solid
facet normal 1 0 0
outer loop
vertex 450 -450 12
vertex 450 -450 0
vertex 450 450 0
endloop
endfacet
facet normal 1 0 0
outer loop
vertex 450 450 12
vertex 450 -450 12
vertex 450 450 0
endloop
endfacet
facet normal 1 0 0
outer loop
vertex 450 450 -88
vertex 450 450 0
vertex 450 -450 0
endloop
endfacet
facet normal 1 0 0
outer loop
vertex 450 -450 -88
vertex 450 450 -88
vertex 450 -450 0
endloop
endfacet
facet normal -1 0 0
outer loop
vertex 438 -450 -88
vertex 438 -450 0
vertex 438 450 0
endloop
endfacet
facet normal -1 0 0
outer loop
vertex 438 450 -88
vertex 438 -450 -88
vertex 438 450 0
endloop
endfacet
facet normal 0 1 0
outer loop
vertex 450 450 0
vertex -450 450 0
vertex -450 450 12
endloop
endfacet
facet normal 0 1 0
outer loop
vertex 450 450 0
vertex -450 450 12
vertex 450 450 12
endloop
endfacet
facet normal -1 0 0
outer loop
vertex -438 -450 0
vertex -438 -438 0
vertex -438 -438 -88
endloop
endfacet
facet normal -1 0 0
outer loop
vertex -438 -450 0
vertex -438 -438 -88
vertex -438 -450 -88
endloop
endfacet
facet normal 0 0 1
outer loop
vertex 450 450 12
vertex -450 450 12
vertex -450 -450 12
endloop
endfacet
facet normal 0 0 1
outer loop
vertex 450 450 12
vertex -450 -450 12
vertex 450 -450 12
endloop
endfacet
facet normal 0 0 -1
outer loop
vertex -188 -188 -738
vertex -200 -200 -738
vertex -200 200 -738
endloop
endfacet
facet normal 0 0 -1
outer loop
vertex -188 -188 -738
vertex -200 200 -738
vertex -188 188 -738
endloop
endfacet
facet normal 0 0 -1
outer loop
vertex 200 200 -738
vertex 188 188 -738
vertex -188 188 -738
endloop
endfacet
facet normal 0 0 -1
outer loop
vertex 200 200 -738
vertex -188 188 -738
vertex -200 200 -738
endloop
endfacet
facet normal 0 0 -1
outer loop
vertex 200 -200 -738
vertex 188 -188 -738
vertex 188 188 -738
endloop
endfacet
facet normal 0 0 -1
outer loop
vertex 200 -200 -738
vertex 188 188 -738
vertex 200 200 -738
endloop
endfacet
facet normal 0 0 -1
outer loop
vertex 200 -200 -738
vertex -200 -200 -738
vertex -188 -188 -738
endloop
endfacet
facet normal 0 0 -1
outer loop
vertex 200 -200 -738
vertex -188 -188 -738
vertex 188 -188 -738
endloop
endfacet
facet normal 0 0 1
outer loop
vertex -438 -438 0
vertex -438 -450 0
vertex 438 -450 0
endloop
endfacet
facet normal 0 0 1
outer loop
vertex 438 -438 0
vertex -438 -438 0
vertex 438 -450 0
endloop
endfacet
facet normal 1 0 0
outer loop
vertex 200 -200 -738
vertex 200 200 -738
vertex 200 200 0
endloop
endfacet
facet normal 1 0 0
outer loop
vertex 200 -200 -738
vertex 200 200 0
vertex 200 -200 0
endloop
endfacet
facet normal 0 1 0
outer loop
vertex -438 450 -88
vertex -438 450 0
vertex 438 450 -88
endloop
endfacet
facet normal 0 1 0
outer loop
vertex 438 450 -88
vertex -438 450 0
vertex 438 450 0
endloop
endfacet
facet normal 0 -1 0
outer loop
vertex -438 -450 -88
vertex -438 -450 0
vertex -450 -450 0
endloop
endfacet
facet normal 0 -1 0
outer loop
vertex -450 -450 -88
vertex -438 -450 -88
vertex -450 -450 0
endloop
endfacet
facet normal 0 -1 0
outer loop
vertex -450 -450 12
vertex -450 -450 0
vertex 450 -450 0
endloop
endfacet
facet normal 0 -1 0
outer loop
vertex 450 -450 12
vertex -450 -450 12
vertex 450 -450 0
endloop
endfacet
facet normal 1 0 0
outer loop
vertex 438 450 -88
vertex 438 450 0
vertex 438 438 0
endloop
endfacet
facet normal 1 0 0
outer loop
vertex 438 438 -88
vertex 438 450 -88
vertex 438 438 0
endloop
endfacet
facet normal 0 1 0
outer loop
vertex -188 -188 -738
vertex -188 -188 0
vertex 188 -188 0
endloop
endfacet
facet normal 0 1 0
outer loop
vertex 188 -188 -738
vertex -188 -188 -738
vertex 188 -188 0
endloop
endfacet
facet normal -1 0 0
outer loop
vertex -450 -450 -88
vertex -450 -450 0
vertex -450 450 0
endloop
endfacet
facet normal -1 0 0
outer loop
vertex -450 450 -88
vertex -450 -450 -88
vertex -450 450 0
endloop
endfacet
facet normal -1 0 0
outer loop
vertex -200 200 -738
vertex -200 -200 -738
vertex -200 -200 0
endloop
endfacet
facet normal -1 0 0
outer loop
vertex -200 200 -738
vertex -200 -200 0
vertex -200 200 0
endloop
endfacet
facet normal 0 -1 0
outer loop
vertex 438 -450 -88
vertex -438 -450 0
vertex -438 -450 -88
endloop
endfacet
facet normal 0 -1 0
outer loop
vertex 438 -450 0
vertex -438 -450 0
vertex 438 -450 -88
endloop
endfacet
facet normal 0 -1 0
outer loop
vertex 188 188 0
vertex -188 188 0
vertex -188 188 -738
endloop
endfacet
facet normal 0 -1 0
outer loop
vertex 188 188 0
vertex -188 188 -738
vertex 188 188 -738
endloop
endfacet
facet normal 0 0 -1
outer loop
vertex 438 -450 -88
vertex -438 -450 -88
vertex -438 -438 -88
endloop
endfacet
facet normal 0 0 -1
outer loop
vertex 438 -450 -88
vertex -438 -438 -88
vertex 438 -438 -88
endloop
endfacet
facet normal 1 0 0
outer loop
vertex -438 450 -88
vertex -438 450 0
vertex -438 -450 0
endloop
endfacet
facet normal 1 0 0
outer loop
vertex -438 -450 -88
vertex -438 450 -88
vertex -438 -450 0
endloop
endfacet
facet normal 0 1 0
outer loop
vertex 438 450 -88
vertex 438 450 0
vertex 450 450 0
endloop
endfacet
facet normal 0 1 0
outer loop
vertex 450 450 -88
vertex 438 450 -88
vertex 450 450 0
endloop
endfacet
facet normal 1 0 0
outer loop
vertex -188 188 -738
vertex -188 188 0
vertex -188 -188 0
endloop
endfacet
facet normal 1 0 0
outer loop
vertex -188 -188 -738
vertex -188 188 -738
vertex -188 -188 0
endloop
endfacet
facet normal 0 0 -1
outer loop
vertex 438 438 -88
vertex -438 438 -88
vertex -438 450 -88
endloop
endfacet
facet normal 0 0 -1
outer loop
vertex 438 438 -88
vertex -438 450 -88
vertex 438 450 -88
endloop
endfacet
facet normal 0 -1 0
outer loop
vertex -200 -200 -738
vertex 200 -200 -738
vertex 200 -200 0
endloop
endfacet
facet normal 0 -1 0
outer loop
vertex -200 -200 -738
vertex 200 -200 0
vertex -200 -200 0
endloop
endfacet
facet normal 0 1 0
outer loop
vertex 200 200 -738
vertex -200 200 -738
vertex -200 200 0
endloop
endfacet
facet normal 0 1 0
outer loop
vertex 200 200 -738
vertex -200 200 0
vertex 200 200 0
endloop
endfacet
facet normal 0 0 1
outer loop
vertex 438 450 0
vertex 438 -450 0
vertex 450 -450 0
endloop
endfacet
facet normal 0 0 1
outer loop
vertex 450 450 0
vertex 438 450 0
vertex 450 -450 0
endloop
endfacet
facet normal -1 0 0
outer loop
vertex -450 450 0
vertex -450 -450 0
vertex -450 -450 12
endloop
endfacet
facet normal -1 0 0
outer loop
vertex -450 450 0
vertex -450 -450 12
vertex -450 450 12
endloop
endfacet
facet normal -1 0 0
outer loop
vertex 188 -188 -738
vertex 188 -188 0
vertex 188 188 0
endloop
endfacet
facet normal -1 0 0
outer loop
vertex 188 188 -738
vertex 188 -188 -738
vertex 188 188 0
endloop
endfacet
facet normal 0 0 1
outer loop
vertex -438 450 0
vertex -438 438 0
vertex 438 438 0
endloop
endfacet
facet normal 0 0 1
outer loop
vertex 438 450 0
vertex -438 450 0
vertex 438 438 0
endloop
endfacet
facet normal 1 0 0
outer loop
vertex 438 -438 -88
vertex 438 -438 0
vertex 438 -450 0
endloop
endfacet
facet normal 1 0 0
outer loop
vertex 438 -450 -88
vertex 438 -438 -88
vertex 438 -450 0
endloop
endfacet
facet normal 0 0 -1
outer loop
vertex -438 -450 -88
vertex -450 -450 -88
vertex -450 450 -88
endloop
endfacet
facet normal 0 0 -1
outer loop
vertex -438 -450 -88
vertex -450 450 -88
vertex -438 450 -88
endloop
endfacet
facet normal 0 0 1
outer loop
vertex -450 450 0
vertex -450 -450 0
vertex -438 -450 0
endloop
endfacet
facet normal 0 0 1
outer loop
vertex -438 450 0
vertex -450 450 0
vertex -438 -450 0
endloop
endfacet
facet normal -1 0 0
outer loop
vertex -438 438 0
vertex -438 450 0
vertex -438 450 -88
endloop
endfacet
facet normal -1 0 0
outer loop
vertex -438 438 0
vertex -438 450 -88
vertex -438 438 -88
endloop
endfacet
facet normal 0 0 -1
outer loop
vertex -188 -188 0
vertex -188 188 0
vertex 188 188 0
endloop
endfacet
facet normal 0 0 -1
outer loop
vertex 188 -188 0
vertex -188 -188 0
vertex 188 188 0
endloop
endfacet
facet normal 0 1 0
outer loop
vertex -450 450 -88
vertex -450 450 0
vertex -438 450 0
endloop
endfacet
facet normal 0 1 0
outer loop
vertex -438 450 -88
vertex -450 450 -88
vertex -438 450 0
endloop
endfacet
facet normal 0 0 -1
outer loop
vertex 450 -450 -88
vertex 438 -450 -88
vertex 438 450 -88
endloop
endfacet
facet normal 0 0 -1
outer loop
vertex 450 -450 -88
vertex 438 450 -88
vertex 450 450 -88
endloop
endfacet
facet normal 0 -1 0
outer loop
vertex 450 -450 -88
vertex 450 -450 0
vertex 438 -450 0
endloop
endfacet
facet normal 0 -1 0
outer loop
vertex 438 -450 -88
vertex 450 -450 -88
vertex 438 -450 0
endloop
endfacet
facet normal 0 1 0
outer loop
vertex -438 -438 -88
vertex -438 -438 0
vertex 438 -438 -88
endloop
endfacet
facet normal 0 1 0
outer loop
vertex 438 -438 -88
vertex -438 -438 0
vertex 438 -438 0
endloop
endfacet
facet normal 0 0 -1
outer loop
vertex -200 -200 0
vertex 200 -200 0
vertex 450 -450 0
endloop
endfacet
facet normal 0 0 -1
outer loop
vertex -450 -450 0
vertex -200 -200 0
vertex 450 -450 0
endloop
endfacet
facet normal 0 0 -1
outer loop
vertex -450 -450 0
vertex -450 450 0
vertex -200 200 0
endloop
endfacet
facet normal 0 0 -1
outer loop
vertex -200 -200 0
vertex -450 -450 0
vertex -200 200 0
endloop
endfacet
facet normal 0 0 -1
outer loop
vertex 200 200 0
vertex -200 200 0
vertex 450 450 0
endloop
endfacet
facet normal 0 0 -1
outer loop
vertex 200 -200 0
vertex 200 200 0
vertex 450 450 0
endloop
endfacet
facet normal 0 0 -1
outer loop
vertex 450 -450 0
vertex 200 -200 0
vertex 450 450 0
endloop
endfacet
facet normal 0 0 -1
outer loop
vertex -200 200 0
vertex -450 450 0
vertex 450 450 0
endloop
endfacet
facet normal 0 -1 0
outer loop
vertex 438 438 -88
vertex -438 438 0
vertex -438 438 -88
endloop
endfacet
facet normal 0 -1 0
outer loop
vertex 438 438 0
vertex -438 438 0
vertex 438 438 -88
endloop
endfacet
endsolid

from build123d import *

# Parameters (mm, degrees)
F0_W     = 900
F0_H     = 900
F1_DEPTH = 12
F3_DEPTH = 88
F2_W     = 876
F2_H     = 12
F4_DEPTH = 88
F5_DEPTH = 88
F6_DEPTH = 88
F7_W     = 376
F7_H     = 12
F8_DEPTH = 738


with BuildPart() as f1:
    # F0 (on Top) → F1 (new body)
    with BuildSketch(Plane.XY):
        Rectangle(F0_W, F0_H)
    extrude(amount=F1_DEPTH)

    # F7 (on face) → F8 (join)
    with BuildSketch(Plane(origin=(0, 0, 0), x_dir=(1, 0, 0), z_dir=(0, 0, -1))):
        Polygon((-188, 200), (-200, 200), (-200, -200), (-188, -200), (-188, -188), (-188, 188), align=None)
        with Locations((0, 194)):
            Rectangle(F7_W, F7_H)
        Polygon((200, 200), (188, 200), (188, 188), (188, -188), (188, -200), (200, -200), align=None)
        with Locations((0, -194)):
            Rectangle(F7_W, F7_H)
    extrude(amount=F8_DEPTH)


with BuildPart() as f3:
    # F2 (on face) → F3 (new body)
    with BuildSketch(Plane(origin=(0, 0, 0), x_dir=(1, 0, 0), z_dir=(0, 0, -1))):
        Polygon((-438, 450), (-450, 450), (-450, -450), (-438, -450), (-438, -438), (-438, 438), align=None)
    extrude(amount=F3_DEPTH)


with BuildPart() as f4:
    # F2 (on face) → F4 (new body)
    with BuildSketch(Plane(origin=(0, 0, 0), x_dir=(1, 0, 0), z_dir=(0, 0, -1))):
        with Locations((0, 444)):
            Rectangle(F2_W, F2_H)
    extrude(amount=F4_DEPTH)


with BuildPart() as f5:
    # F2 (on face) → F5 (new body)
    with BuildSketch(Plane(origin=(0, 0, 0), x_dir=(1, 0, 0), z_dir=(0, 0, -1))):
        Polygon((450, 450), (438, 450), (438, 438), (438, -438), (438, -450), (450, -450), align=None)
    extrude(amount=F5_DEPTH)


with BuildPart() as f6:
    # F2 (on face) → F6 (new body)
    with BuildSketch(Plane(origin=(0, 0, 0), x_dir=(1, 0, 0), z_dir=(0, 0, -1))):
        with Locations((0, -444)):
            Rectangle(F2_W, F2_H)
    extrude(amount=F6_DEPTH)


solid = Compound([f1.part, f3.part, f4.part, f5.part, f6.part])
